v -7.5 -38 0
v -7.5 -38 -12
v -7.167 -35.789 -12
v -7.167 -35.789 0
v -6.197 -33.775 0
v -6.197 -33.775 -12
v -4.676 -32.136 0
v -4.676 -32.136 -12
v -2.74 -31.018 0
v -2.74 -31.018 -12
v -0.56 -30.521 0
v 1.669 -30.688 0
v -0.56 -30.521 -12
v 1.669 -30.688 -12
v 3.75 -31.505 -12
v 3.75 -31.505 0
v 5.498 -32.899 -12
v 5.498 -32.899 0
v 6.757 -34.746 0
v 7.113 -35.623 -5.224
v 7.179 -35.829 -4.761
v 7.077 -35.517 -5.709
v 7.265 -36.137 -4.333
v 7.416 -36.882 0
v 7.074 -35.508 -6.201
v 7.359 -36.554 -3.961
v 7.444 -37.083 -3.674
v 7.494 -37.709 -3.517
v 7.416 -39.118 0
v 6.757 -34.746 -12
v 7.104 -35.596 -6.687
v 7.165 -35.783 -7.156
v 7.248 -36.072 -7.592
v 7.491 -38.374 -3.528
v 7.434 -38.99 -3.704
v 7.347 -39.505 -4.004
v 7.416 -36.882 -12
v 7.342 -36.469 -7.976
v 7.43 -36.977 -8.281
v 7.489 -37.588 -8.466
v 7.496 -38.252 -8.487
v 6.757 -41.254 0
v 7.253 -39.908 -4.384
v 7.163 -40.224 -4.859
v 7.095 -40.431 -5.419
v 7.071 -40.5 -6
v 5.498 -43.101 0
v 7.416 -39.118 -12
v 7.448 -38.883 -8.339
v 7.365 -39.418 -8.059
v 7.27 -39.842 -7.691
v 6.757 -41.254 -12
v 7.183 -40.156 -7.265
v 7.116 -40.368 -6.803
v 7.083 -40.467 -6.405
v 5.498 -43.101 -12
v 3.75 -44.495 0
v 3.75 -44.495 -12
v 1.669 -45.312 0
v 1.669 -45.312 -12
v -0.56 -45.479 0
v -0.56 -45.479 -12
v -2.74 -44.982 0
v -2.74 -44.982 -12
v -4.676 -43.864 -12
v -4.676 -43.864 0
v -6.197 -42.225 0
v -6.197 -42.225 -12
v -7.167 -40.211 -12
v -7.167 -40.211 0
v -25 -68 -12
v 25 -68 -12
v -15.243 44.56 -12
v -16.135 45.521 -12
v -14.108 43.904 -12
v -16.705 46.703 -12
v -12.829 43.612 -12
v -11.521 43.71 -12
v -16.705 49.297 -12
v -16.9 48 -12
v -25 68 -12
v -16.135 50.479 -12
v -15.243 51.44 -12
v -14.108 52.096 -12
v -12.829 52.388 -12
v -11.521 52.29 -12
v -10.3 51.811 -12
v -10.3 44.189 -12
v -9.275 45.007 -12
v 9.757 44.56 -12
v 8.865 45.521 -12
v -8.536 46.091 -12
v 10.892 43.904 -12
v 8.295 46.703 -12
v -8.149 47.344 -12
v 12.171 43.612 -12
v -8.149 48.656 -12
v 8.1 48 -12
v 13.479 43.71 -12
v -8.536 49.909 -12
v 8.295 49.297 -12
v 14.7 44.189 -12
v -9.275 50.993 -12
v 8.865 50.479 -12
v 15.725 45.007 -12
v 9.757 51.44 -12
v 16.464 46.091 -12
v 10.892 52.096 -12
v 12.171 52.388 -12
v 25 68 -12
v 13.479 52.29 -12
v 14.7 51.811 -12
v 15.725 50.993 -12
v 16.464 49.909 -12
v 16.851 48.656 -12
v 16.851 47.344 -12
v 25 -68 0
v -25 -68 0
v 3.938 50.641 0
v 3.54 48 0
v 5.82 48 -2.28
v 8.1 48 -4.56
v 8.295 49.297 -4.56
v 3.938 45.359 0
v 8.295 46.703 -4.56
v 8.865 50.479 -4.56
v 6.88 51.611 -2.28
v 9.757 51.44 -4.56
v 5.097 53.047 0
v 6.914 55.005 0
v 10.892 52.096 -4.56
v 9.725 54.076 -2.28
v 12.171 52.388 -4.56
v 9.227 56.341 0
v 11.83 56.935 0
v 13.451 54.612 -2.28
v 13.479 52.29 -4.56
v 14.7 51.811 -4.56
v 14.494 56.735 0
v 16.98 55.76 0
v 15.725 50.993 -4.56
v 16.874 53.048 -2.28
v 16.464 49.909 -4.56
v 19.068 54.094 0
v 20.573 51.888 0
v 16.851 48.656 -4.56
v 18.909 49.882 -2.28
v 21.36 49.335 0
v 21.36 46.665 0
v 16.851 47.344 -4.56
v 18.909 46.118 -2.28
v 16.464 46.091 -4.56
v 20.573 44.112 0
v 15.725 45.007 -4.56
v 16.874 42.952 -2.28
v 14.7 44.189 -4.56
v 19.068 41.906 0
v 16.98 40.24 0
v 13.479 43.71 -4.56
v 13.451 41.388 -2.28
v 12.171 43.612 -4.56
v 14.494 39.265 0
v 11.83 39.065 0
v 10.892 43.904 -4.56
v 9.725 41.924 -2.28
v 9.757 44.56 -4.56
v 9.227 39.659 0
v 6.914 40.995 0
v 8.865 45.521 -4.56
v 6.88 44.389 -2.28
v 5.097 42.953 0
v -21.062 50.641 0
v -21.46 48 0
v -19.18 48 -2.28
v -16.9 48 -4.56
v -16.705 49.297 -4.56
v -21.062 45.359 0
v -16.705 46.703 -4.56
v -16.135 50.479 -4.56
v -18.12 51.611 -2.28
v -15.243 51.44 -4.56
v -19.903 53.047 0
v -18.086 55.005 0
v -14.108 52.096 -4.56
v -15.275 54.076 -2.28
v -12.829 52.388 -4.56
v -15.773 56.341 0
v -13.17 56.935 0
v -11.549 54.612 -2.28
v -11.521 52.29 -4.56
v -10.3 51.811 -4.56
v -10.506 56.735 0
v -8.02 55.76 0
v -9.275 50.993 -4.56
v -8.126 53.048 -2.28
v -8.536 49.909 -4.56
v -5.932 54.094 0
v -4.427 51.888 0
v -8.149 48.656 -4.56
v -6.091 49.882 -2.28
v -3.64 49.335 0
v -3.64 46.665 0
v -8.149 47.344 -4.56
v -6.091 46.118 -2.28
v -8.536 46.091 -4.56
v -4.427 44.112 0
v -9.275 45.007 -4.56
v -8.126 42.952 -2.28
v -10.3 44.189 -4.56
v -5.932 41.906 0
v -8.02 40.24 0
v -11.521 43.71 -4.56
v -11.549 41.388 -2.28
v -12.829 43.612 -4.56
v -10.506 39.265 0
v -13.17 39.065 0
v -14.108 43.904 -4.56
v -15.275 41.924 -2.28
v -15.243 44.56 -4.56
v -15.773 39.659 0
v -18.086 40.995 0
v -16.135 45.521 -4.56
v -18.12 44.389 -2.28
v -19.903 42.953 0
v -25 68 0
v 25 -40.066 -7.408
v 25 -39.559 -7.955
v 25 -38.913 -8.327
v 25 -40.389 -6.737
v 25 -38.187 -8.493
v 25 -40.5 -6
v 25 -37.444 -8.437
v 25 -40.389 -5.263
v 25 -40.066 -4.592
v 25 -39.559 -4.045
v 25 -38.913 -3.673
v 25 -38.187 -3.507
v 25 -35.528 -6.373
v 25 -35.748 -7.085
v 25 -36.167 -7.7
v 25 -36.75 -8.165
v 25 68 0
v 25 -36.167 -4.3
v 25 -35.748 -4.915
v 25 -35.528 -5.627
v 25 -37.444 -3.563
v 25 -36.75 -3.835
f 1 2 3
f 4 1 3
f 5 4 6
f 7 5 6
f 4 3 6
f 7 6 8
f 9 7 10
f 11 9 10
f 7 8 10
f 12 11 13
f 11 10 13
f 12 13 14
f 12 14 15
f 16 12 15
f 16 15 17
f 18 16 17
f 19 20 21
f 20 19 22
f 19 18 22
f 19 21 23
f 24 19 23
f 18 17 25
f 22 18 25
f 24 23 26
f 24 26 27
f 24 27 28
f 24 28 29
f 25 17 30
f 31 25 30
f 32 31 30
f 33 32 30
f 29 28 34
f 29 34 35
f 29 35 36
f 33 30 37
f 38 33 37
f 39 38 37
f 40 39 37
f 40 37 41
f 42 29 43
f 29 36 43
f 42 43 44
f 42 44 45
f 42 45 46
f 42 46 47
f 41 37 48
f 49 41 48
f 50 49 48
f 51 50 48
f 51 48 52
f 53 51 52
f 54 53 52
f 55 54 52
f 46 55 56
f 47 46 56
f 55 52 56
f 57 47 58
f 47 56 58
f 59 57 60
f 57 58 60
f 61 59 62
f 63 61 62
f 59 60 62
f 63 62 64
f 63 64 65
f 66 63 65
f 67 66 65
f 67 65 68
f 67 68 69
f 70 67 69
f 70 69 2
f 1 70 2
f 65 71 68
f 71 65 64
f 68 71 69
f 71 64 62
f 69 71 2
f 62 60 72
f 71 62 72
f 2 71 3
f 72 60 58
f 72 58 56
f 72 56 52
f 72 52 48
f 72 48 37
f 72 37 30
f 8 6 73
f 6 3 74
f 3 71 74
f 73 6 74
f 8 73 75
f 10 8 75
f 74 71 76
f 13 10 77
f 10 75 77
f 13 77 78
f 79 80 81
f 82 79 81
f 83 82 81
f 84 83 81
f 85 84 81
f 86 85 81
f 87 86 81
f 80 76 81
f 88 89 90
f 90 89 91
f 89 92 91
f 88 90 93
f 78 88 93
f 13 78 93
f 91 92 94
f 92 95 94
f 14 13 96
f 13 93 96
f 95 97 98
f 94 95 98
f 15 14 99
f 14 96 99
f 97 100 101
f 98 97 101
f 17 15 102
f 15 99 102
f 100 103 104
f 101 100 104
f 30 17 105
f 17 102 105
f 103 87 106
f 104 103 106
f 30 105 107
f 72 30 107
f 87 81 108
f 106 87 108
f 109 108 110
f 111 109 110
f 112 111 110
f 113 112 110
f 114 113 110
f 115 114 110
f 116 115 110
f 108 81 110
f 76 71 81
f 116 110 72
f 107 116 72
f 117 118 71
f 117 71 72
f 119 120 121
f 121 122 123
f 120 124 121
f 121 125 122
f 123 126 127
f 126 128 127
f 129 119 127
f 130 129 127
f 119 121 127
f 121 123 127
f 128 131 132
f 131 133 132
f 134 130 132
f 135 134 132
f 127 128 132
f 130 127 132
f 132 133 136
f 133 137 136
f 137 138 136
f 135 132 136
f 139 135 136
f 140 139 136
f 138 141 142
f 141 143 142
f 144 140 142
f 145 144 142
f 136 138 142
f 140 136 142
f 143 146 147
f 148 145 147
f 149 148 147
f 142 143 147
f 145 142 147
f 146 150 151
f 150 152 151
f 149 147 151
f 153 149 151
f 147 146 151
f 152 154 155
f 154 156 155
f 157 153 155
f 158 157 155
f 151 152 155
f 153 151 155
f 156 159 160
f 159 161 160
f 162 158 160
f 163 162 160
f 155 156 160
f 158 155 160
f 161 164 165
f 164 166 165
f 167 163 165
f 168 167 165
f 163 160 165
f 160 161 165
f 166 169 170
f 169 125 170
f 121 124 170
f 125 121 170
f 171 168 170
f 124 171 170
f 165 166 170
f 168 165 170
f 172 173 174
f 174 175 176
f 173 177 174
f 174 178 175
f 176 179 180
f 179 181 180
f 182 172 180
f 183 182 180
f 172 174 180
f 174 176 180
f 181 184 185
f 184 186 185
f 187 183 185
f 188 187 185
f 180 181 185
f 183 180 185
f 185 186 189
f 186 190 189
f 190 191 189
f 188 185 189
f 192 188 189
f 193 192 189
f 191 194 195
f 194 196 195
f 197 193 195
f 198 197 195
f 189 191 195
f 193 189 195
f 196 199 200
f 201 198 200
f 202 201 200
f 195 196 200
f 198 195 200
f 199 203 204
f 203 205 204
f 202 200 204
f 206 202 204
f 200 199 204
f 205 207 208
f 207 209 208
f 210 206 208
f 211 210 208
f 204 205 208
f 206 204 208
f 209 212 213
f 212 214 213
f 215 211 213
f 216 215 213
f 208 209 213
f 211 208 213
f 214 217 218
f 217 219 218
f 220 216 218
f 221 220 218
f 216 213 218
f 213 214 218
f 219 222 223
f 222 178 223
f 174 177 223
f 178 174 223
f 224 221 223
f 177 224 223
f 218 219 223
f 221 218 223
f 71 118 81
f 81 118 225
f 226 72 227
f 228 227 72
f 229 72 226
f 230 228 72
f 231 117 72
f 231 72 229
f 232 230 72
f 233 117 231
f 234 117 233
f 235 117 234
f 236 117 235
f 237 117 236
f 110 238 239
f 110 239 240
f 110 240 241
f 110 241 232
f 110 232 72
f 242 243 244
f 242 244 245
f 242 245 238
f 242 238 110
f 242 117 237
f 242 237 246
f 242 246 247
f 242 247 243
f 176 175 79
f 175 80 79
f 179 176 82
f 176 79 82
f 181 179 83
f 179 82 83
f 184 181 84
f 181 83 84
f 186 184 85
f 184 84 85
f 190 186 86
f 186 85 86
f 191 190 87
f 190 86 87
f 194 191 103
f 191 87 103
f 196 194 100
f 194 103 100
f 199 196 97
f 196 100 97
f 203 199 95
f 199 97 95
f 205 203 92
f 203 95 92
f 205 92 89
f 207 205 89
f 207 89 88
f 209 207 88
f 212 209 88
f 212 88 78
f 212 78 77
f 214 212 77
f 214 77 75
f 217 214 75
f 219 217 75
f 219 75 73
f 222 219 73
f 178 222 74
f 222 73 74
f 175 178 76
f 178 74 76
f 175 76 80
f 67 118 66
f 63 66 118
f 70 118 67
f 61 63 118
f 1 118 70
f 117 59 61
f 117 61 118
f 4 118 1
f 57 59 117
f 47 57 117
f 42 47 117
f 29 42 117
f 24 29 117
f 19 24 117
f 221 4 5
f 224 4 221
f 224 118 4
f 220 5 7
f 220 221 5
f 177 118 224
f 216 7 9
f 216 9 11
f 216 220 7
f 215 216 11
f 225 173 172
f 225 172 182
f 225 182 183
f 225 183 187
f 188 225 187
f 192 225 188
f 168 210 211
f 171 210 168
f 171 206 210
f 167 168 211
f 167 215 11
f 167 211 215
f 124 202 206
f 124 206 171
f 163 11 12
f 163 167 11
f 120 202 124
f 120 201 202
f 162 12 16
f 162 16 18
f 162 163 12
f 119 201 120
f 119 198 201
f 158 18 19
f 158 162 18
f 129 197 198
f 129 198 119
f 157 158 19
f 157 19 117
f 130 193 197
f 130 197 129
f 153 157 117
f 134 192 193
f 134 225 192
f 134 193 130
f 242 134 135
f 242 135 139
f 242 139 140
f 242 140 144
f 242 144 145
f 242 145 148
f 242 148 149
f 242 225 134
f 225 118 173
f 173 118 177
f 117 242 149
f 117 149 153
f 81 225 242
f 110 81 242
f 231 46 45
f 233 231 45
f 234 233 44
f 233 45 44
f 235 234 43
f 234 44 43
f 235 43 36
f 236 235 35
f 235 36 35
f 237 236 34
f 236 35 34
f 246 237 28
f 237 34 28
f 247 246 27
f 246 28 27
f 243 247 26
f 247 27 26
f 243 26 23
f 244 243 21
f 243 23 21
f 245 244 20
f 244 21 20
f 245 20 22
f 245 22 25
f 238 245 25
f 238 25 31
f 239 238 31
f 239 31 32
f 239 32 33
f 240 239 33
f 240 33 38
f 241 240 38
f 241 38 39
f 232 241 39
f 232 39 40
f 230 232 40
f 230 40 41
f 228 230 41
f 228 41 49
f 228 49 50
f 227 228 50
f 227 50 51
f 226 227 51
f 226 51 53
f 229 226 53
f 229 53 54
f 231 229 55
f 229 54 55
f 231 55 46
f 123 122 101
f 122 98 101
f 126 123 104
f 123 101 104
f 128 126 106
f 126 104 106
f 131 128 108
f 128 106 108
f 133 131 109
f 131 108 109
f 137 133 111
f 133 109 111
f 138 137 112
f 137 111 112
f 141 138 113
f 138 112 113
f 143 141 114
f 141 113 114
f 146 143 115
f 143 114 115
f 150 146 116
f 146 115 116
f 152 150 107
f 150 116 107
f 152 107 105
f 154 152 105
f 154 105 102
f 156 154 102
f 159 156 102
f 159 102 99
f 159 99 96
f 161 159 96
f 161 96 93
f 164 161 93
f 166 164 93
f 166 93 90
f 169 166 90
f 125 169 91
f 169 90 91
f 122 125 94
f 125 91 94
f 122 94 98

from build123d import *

# Parameters (mm, degrees)
F0_W           = 50
F0_H           = 136
F1_DEPTH       = 12
F3_D           = 15
F5_D           = 8.8
F5_CSINK_D     = 17.92
F5_CSINK_ANGLE = 90
F7_D           = 5
F7_DEPTH       = 20
F7_TIP         = 1.5021515476


with BuildPart() as f1:
    # F0 (on Top) → F1 (new body)
    with BuildSketch(Plane.XY):
        Rectangle(F0_W, F0_H)
    extrude(amount=-F1_DEPTH)

    # F3 (through all)
    with Locations(Plane.XY):
        with Locations((0, -38)):
            Hole(F3_D / 2)

    # F5 (through all)
    with Locations(Plane.XY):
        with Locations((12.5, 48), (-12.5, 48)):
            CounterSinkHole(F5_D / 2, F5_CSINK_D / 2, counter_sink_angle=F5_CSINK_ANGLE)

    # F7
    with Locations(Plane.YZ.offset(25)):
        with Locations((-38, -6)):
            Hole(F7_D / 2, depth=F7_DEPTH)
            with Locations((0, 0, -(F7_DEPTH + F7_TIP / 2))):  # 118° drill point
                Cone(0, F7_D / 2, F7_TIP, mode=Mode.SUBTRACT)


solid = f1.part
